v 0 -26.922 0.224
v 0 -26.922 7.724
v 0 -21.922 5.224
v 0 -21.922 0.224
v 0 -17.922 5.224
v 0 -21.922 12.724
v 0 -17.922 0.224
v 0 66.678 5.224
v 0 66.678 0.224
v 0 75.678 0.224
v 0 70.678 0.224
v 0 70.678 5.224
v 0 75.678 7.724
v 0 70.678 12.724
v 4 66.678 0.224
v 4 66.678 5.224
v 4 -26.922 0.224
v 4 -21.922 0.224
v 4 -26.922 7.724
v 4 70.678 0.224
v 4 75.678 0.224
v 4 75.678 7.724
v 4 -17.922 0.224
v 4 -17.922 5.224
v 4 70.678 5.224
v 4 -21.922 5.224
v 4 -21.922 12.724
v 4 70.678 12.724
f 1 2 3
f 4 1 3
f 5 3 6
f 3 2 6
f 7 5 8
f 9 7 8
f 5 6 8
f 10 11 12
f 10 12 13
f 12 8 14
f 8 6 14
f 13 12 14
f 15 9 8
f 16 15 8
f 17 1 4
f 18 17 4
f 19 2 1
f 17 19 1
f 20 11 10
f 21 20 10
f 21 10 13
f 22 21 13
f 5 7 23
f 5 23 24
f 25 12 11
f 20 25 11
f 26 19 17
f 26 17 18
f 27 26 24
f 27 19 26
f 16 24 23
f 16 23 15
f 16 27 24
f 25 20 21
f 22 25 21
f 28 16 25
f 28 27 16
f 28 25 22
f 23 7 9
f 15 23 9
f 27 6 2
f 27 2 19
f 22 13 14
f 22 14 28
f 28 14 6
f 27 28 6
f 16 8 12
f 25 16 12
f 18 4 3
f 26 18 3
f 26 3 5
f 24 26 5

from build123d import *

# Parameters (mm, degrees)
SKETCH1_W           = 42.3
SKETCH1_H           = 5
BOSS_EXTRUDE1_DEPTH = 4
CHAMFER1_SIZE       = 5


with BuildPart() as part:
    # Sketch1 → Boss-Extrude1 (new body)
    with BuildSketch(Plane.YZ):
        Polygon((-21.921641791, 5.223880597), (-17.921641791, 5.223880597), (24.378358209, 5.223880597), (66.678358209, 5.223880597), (70.678358209, 5.223880597), (70.678358209, 0.223880597), (75.678358209, 0.223880597), (75.678358209, 12.723880597), (-26.921641791, 12.723880597), (-26.921641791, 0.223880597), (-21.921641791, 0.223880597), align=None)
        with Locations((3.228358209, 2.723880597)):
            Rectangle(SKETCH1_W, SKETCH1_H)
        with Locations((45.528358209, 2.723880597)):
            Rectangle(SKETCH1_W, SKETCH1_H)
    extrude(amount=BOSS_EXTRUDE1_DEPTH)

    # Chamfer1
    chamfer1_edges = [part.edges().sort_by_distance(p)[0] for p in [
        (2, -26.921641791, 12.723880597),
        (2, 75.678358209, 12.723880597),
    ]]
    chamfer(chamfer1_edges, length=CHAMFER1_SIZE)


solid = part.part
